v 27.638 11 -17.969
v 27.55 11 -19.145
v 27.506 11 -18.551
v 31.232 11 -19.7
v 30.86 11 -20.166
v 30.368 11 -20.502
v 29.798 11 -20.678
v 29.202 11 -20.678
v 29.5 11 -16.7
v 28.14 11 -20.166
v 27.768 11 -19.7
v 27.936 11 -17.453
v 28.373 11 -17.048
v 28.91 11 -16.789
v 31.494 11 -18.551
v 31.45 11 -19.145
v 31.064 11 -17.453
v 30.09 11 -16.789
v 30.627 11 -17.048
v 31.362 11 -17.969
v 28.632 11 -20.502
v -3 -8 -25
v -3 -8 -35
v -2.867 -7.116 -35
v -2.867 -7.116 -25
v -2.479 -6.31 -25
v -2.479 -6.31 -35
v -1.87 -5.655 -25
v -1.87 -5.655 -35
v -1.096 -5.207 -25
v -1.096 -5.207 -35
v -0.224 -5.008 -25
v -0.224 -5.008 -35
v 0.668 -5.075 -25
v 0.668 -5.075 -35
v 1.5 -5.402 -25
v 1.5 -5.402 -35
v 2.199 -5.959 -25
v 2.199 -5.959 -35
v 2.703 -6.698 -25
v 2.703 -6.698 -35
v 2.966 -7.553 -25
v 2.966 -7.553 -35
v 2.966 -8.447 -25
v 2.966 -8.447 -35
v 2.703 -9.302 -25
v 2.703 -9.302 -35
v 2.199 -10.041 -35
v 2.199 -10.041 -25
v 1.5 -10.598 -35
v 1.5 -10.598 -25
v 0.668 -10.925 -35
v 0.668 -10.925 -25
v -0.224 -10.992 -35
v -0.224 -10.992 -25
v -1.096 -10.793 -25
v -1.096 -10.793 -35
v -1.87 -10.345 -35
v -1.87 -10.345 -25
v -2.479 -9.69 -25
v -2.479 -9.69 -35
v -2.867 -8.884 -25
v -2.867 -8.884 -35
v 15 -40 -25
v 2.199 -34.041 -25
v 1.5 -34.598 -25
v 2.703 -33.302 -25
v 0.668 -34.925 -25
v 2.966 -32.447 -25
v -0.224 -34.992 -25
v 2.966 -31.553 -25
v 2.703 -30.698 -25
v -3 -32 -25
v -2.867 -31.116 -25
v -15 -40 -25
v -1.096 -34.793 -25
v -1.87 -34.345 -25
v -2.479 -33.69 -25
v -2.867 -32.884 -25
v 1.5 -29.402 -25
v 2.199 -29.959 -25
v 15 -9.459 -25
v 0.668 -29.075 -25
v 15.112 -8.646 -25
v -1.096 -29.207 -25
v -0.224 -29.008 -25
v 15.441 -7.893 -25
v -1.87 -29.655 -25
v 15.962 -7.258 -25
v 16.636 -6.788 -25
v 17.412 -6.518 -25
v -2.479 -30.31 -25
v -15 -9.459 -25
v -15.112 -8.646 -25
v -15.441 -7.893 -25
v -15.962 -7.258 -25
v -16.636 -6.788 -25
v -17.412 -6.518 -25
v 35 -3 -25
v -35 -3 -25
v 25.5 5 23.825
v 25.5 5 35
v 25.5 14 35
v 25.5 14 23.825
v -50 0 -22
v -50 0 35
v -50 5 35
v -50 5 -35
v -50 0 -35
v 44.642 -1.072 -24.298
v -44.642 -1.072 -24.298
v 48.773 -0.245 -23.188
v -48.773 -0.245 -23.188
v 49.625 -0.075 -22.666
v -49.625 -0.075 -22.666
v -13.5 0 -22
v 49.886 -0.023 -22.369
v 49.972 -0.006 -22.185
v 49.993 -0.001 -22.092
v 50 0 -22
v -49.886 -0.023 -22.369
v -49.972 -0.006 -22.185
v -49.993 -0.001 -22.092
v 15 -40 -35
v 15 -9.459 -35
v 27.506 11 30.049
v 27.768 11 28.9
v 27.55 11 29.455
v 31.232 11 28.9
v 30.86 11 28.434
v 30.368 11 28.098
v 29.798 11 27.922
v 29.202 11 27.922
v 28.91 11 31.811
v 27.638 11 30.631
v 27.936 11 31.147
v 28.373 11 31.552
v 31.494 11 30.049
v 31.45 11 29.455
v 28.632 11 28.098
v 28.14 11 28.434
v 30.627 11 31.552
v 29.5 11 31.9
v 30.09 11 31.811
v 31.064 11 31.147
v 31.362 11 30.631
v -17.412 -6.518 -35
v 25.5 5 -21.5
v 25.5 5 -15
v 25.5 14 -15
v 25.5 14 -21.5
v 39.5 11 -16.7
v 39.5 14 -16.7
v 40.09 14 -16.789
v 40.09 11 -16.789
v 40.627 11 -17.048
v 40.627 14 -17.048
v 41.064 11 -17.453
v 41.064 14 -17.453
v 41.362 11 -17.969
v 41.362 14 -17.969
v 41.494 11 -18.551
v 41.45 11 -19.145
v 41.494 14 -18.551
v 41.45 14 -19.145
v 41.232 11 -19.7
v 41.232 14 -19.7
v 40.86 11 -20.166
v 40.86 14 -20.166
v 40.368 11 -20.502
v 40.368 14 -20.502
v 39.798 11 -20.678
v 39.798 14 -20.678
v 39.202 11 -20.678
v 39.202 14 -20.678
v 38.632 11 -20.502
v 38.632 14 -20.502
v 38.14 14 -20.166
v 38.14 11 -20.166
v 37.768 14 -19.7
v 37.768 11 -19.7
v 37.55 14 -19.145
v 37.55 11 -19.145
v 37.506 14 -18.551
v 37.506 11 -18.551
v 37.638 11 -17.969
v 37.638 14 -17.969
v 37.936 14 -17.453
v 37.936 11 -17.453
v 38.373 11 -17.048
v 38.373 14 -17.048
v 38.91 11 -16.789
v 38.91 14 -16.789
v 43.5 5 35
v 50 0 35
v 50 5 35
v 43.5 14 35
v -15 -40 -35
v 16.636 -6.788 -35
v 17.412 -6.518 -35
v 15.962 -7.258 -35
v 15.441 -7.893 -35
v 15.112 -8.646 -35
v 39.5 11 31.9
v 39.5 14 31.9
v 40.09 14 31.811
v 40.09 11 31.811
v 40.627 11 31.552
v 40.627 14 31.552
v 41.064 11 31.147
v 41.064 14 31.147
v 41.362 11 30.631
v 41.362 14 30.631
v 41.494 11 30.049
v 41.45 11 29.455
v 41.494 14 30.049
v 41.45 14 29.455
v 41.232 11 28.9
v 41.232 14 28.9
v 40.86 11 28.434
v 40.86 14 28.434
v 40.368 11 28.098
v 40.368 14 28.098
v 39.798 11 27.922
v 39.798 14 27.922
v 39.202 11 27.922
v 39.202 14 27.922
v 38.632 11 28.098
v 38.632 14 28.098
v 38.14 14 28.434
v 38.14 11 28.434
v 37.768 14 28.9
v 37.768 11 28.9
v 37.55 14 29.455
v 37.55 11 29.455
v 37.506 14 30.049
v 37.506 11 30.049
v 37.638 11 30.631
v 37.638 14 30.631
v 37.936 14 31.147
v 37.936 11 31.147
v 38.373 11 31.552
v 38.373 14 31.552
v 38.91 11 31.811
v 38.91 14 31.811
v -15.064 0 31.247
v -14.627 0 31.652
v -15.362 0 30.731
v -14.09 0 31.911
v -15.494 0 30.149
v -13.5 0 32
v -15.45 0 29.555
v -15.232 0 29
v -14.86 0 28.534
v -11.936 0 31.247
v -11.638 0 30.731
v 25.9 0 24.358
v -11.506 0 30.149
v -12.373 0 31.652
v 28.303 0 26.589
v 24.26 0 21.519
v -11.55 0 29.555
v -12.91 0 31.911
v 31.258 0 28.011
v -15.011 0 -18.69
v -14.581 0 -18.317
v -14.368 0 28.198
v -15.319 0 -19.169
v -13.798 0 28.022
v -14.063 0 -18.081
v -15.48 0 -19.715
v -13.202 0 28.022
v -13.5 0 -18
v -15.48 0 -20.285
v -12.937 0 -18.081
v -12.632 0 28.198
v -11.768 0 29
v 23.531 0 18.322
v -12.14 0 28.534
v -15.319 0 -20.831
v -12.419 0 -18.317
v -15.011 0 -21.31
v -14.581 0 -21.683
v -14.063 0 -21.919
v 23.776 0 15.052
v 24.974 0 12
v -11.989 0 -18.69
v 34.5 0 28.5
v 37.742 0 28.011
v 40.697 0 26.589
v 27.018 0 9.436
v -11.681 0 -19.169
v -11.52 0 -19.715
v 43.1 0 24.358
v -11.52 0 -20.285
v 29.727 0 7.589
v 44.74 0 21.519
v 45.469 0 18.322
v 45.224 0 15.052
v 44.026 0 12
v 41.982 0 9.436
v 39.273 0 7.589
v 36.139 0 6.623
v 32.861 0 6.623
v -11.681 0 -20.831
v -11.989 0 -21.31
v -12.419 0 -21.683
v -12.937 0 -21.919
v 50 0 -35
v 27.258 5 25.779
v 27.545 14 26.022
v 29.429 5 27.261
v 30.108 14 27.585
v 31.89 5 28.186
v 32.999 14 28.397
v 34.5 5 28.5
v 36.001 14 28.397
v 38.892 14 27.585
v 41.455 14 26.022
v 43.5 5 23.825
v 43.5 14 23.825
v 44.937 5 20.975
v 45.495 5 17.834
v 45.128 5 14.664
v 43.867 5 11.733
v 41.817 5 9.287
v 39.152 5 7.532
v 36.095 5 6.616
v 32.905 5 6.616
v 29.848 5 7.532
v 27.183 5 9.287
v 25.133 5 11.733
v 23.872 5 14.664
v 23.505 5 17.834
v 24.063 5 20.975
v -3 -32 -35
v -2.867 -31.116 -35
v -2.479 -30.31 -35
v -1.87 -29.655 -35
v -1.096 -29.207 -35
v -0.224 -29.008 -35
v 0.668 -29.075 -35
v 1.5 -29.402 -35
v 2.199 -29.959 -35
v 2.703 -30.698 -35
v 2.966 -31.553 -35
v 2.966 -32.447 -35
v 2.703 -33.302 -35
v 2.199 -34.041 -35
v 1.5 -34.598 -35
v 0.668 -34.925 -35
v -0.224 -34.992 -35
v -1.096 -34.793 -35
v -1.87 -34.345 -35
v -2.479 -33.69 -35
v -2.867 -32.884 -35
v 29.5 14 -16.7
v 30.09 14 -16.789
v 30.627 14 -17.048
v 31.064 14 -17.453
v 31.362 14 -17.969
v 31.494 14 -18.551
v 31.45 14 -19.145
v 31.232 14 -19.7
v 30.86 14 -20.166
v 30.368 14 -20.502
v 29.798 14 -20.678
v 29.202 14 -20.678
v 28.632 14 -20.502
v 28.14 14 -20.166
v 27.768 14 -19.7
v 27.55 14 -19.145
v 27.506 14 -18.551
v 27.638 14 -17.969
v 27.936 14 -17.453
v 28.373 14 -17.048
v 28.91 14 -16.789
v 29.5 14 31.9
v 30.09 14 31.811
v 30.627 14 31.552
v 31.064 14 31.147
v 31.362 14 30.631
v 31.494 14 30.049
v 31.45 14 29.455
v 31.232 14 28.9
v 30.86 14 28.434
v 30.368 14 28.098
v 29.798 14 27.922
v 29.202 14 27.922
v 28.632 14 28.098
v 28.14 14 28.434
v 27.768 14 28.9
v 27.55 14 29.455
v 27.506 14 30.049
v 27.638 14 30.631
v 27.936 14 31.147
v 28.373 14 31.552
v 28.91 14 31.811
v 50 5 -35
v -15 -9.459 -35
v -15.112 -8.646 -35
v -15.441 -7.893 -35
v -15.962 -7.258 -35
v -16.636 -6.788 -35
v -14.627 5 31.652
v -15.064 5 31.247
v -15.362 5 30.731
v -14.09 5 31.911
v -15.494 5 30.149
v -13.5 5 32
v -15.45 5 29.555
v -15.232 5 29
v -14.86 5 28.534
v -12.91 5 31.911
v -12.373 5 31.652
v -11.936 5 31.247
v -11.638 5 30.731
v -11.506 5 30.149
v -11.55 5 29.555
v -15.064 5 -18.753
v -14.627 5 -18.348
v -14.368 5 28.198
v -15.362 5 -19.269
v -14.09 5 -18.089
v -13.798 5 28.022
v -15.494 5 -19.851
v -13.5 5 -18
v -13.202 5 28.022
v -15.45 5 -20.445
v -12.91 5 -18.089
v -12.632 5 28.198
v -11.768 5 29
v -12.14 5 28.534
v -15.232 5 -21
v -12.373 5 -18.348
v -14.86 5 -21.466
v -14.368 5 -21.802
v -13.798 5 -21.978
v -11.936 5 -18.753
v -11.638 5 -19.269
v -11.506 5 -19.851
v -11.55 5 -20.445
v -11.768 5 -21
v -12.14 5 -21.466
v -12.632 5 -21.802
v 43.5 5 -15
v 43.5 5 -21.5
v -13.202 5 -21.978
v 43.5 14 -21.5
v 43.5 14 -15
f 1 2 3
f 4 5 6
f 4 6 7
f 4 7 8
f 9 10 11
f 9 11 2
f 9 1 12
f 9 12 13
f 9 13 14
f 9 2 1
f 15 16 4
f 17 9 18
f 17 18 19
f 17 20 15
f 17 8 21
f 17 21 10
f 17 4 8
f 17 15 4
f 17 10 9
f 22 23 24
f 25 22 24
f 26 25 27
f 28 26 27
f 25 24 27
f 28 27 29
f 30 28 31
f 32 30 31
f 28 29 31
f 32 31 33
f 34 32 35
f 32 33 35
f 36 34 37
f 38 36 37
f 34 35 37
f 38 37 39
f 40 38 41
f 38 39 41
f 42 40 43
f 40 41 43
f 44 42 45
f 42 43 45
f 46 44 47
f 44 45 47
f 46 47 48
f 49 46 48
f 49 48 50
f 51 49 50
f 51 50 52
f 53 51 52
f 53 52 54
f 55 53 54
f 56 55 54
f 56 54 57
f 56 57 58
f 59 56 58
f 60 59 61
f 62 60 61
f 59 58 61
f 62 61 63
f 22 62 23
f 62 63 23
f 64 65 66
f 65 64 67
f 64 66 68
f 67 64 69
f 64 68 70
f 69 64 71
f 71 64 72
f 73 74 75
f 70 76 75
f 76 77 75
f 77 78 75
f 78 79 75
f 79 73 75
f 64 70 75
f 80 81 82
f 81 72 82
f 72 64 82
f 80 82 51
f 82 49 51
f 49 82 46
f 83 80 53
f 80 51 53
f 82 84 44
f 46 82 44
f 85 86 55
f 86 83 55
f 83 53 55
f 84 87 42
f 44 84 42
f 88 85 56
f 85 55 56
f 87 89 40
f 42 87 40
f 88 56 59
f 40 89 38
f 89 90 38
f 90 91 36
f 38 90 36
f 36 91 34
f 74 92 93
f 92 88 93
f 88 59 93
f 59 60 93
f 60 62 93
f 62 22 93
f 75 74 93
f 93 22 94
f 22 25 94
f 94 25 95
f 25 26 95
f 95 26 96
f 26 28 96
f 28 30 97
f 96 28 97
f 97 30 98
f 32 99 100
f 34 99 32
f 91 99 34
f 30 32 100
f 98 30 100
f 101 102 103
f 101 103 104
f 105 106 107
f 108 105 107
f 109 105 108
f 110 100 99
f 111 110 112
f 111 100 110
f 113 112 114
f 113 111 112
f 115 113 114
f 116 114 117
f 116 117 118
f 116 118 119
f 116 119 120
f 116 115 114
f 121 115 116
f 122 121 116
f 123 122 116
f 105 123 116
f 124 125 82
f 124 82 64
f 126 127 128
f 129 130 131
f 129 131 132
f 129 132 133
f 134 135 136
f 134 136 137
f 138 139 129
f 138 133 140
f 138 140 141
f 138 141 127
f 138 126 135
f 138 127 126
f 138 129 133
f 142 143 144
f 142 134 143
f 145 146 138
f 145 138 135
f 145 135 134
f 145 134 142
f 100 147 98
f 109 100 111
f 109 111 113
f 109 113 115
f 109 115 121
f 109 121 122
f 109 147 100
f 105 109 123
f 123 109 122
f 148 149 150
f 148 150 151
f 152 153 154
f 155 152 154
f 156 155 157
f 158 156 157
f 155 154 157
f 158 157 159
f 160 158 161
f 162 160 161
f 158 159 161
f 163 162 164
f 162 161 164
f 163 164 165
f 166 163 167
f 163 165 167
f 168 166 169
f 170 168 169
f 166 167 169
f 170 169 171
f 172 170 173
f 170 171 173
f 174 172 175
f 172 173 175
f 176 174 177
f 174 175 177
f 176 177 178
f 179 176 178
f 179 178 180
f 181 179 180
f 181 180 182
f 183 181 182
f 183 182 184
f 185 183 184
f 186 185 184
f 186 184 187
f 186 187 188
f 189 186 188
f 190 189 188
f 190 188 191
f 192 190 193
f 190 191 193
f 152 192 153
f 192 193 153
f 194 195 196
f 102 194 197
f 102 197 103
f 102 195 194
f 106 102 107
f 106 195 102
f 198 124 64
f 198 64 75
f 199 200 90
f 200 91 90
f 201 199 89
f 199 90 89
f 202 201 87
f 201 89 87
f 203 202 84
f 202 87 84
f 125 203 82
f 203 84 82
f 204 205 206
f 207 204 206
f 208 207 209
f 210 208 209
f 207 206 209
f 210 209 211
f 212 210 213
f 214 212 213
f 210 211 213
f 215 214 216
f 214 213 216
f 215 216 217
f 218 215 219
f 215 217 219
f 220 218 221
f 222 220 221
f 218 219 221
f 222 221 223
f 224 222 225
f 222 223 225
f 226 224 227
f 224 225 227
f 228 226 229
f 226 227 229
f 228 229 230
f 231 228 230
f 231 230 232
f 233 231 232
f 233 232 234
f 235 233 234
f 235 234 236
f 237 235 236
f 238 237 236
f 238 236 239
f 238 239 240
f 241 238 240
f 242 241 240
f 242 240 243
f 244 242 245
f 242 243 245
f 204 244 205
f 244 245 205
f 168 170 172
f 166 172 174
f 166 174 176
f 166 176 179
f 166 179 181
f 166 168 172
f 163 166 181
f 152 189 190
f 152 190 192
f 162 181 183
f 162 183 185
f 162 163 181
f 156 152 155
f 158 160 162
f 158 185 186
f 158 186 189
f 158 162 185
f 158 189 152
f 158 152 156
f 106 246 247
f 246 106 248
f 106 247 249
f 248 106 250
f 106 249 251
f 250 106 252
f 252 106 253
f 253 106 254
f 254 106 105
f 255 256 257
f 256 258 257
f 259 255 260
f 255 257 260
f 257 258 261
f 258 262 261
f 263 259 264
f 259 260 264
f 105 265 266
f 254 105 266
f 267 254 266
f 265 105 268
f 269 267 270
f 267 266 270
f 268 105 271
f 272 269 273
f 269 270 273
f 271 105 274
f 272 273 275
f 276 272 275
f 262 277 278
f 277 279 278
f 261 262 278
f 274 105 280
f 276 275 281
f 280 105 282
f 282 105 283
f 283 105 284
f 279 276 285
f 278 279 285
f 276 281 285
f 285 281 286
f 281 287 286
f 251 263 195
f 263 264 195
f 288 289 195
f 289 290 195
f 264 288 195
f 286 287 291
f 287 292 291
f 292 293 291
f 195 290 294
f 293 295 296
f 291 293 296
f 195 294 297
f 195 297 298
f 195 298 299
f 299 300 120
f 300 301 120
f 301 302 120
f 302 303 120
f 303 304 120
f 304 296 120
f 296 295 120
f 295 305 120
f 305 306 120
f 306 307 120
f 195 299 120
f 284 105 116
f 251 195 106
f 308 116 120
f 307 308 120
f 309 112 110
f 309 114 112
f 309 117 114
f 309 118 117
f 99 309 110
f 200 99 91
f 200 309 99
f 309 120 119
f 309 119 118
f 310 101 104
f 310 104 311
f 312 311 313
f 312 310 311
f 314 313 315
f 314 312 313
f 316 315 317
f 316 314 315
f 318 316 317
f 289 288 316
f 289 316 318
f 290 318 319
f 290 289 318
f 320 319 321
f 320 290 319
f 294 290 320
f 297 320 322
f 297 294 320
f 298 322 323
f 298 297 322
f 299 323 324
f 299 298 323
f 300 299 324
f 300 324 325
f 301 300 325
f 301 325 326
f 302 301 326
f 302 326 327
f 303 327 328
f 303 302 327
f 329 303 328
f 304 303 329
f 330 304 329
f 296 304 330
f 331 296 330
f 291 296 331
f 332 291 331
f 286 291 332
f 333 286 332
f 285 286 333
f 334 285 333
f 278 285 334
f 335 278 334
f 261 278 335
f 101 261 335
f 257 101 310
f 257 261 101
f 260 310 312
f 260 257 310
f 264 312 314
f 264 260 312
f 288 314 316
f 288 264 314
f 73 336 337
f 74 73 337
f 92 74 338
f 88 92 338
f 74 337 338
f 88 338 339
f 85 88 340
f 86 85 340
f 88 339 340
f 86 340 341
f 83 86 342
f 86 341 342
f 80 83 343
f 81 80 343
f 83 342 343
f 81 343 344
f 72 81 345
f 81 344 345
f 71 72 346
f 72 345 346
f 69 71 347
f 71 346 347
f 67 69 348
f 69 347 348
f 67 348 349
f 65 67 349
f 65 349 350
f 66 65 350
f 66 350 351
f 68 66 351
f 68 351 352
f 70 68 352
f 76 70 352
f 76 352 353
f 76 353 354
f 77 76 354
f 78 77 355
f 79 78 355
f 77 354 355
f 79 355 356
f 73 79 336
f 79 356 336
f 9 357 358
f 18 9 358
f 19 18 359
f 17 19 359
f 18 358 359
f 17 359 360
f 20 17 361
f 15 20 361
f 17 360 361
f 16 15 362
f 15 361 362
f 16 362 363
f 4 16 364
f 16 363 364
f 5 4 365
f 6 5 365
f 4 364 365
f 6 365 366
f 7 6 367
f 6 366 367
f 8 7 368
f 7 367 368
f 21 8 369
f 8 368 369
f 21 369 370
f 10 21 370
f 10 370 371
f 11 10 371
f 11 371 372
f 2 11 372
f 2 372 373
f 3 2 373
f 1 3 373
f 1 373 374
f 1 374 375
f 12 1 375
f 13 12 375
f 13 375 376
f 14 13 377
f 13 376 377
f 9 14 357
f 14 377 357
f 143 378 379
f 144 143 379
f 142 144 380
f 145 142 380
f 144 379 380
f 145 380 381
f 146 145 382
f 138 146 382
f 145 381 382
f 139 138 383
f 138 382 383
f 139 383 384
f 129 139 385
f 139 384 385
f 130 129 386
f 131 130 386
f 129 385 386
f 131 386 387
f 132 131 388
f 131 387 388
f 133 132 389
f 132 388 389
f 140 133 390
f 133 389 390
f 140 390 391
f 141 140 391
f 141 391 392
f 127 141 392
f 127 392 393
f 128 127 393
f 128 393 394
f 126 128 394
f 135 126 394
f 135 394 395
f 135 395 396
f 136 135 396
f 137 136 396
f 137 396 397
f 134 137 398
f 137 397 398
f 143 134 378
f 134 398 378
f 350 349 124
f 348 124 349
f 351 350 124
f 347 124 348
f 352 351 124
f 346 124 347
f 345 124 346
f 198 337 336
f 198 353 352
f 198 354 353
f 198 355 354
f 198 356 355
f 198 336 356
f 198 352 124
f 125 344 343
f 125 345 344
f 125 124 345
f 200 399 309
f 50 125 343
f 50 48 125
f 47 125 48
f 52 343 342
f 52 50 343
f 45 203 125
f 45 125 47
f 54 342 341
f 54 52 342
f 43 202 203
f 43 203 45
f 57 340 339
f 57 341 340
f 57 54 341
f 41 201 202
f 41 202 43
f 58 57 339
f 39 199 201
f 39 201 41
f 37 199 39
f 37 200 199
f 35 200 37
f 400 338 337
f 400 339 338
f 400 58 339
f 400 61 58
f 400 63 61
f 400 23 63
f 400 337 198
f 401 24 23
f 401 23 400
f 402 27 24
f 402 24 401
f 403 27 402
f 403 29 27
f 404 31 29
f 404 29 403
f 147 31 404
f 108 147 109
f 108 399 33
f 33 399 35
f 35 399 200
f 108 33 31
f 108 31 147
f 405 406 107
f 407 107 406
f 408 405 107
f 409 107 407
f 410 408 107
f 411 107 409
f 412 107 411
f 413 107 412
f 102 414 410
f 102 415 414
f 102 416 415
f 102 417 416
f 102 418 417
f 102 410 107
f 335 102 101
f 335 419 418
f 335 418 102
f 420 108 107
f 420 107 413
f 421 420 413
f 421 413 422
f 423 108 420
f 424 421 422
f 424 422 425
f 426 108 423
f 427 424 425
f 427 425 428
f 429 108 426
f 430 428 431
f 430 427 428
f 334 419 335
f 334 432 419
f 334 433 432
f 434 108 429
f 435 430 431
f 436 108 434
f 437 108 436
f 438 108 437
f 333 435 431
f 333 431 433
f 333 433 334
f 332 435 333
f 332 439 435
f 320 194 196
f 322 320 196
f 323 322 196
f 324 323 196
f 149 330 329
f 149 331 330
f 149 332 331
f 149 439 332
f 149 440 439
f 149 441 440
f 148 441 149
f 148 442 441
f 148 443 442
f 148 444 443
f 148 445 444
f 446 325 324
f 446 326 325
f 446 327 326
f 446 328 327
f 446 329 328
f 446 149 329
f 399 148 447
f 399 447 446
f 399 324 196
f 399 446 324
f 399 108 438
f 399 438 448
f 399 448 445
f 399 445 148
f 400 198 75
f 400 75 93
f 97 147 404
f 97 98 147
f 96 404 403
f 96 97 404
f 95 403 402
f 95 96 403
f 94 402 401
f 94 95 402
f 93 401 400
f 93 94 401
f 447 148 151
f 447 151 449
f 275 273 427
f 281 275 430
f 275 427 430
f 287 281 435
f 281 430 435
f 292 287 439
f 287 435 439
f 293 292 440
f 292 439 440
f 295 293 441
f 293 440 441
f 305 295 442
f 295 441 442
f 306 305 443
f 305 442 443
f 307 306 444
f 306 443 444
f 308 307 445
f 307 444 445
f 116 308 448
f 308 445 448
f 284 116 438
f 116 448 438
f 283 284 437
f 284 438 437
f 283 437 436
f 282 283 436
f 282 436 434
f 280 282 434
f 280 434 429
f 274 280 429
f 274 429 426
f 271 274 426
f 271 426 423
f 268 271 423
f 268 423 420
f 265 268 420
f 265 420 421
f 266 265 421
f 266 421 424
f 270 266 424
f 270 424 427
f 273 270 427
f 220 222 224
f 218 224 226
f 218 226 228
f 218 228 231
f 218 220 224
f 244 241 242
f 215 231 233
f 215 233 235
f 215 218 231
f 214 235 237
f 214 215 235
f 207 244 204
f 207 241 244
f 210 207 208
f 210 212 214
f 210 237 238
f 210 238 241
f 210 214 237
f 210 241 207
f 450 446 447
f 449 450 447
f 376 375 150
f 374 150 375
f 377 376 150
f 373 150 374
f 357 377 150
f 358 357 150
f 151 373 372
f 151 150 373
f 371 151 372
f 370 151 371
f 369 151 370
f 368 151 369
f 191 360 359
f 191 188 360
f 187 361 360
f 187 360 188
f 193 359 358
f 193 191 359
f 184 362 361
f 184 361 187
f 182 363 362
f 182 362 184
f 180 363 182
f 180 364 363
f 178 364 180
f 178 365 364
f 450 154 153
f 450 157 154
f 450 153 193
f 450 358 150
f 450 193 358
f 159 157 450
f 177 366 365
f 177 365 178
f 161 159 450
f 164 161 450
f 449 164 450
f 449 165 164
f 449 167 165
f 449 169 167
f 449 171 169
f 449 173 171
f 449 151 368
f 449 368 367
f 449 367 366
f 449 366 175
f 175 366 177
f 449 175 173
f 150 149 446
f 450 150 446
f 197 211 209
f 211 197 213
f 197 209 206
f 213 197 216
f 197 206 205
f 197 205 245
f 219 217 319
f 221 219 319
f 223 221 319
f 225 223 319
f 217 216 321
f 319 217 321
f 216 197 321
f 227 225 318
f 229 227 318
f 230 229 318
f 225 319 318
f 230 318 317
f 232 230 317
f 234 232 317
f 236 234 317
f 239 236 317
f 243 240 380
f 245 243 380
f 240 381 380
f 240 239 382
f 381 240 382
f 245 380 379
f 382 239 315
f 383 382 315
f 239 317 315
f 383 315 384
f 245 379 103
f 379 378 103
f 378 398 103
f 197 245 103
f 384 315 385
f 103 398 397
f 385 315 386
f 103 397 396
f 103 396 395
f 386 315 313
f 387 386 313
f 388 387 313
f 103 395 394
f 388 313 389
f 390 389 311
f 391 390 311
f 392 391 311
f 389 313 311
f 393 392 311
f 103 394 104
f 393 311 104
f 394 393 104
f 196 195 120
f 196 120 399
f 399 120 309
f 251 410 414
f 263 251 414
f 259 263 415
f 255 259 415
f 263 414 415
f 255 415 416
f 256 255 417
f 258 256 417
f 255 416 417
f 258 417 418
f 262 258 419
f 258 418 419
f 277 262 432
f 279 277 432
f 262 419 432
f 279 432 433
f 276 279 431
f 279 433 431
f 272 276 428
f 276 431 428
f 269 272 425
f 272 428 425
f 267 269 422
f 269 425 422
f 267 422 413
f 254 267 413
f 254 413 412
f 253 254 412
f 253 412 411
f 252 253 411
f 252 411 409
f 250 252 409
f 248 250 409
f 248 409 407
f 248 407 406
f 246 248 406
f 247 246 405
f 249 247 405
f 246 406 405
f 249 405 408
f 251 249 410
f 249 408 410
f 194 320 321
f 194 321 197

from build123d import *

# Parameters (mm, degrees)
SKETCH1_W           = 100
SKETCH1_H           = 70
SKETCH1_R           = 11
BOSS_EXTRUDE1_DEPTH = 5
SKETCH2_W           = 18
SKETCH2_H           = 6.5
BOSS_EXTRUDE2_DEPTH = 9
SKETCH3_R           = 2
CUT_EXTRUDE1_DEPTH  = 3
SKETCH4_R           = 3
BOSS_EXTRUDE4_DEPTH = 10
FILLET2_R           = 3
SKETCH5_R           = 2
CUT_EXTRUDE2_DEPTH  = 5


with BuildPart() as part:
    # Sketch1 → Boss-Extrude1 (new body)
    with BuildSketch(Plane(origin=(0, 0, 0), x_dir=(1, 0, 0), z_dir=(0, 1, 0))):
        Rectangle(SKETCH1_W, SKETCH1_H)
        with Locations(Location((34.5, -17.5, 0), (0, 0, 270))):
            Circle(SKETCH1_R, mode=Mode.SUBTRACT)
    extrude(amount=BOSS_EXTRUDE1_DEPTH)

    # Sketch2 → Boss-Extrude2 (add)
    with BuildSketch(Plane(origin=(0, 5, 0), x_dir=(1, 0, 0), z_dir=(0, 1, 0))):
        with BuildLine():
            Line((25.5, -35), (25.5, -23.82455532))
            ThreePointArc((25.5, -23.82455532), (34.5, -28.5), (43.5, -23.82455532))
            Line((43.5, -23.82455532), (43.5, -35))
            Line((43.5, -35), (25.5, -35))
        make_face()
        with Locations((34.5, 18.25)):
            Rectangle(SKETCH2_W, SKETCH2_H)
    extrude(amount=BOSS_EXTRUDE2_DEPTH)

    # Sketch3 → Cut-Extrude1 (cut)
    with BuildSketch(Plane(origin=(0, 14, 0), x_dir=(1, 0, 0), z_dir=(0, 1, 0))):
        with Locations(Location((29.5, -29.9, 0), (0, 0, 270))):
            Circle(SKETCH3_R)
        with Locations(Location((39.5, -29.9, 0), (0, 0, 270))):
            Circle(SKETCH3_R)
        with Locations(Location((39.5, 18.7, 0), (0, 0, 270))):
            Circle(SKETCH3_R)
        with Locations(Location((29.5, 18.7, 0), (0, 0, 270))):
            Circle(SKETCH3_R)
    extrude(amount=-CUT_EXTRUDE1_DEPTH, mode=Mode.SUBTRACT)

    # Sketch4 → Boss-Extrude4 (add)
    # profile 1 of 3: a face of its own
    with BuildSketch(Plane(origin=(0, 0, -35), x_dir=(-1, 0, 0), z_dir=(0, 0, -1))):
        Polygon((-15, -40), (15, -40), (15, -7), (15, 0), (-15, 0), (-15, -7), align=None)
        with Locations((0, -32)):
            Circle(SKETCH4_R, mode=Mode.SUBTRACT)
        with Locations((0, -8)):
            Circle(SKETCH4_R, mode=Mode.SUBTRACT)
    # profile 2 of 3: a face of its own
    with BuildSketch(Plane(origin=(0, 0, -35), x_dir=(-1, 0, 0), z_dir=(0, 0, -1))):
        Polygon((-50, 0), (-15, -7), (-15, 0), align=None)
    # profile 3 of 3: a face of its own
    with BuildSketch(Plane(origin=(0, 0, -35), x_dir=(-1, 0, 0), z_dir=(0, 0, -1))):
        Polygon((15, 0), (15, -7), (50, 0), align=None)
    extrude(amount=-BOSS_EXTRUDE4_DEPTH)

    # Fillet2
    fillet2_edges = [part.edges().sort_by_distance(p)[0] for p in [
        (15, -7, -30),
        (-15, -7, -30),
        (0, 0, -25),
    ]]
    fillet(fillet2_edges, radius=FILLET2_R)

    # Sketch5 → Cut-Extrude2 (cut)
    with BuildSketch(Plane(origin=(0, 5, 0), x_dir=(1, 0, 0), z_dir=(0, 1, 0))):
        with Locations(Location((-13.5, -30, 0), (0, 0, 270))):
            Circle(SKETCH5_R)
        with Locations(Location((-13.5, 20, 0), (0, 0, 270))):
            Circle(SKETCH5_R)
    extrude(amount=-CUT_EXTRUDE2_DEPTH, mode=Mode.SUBTRACT)


solid = part.part
